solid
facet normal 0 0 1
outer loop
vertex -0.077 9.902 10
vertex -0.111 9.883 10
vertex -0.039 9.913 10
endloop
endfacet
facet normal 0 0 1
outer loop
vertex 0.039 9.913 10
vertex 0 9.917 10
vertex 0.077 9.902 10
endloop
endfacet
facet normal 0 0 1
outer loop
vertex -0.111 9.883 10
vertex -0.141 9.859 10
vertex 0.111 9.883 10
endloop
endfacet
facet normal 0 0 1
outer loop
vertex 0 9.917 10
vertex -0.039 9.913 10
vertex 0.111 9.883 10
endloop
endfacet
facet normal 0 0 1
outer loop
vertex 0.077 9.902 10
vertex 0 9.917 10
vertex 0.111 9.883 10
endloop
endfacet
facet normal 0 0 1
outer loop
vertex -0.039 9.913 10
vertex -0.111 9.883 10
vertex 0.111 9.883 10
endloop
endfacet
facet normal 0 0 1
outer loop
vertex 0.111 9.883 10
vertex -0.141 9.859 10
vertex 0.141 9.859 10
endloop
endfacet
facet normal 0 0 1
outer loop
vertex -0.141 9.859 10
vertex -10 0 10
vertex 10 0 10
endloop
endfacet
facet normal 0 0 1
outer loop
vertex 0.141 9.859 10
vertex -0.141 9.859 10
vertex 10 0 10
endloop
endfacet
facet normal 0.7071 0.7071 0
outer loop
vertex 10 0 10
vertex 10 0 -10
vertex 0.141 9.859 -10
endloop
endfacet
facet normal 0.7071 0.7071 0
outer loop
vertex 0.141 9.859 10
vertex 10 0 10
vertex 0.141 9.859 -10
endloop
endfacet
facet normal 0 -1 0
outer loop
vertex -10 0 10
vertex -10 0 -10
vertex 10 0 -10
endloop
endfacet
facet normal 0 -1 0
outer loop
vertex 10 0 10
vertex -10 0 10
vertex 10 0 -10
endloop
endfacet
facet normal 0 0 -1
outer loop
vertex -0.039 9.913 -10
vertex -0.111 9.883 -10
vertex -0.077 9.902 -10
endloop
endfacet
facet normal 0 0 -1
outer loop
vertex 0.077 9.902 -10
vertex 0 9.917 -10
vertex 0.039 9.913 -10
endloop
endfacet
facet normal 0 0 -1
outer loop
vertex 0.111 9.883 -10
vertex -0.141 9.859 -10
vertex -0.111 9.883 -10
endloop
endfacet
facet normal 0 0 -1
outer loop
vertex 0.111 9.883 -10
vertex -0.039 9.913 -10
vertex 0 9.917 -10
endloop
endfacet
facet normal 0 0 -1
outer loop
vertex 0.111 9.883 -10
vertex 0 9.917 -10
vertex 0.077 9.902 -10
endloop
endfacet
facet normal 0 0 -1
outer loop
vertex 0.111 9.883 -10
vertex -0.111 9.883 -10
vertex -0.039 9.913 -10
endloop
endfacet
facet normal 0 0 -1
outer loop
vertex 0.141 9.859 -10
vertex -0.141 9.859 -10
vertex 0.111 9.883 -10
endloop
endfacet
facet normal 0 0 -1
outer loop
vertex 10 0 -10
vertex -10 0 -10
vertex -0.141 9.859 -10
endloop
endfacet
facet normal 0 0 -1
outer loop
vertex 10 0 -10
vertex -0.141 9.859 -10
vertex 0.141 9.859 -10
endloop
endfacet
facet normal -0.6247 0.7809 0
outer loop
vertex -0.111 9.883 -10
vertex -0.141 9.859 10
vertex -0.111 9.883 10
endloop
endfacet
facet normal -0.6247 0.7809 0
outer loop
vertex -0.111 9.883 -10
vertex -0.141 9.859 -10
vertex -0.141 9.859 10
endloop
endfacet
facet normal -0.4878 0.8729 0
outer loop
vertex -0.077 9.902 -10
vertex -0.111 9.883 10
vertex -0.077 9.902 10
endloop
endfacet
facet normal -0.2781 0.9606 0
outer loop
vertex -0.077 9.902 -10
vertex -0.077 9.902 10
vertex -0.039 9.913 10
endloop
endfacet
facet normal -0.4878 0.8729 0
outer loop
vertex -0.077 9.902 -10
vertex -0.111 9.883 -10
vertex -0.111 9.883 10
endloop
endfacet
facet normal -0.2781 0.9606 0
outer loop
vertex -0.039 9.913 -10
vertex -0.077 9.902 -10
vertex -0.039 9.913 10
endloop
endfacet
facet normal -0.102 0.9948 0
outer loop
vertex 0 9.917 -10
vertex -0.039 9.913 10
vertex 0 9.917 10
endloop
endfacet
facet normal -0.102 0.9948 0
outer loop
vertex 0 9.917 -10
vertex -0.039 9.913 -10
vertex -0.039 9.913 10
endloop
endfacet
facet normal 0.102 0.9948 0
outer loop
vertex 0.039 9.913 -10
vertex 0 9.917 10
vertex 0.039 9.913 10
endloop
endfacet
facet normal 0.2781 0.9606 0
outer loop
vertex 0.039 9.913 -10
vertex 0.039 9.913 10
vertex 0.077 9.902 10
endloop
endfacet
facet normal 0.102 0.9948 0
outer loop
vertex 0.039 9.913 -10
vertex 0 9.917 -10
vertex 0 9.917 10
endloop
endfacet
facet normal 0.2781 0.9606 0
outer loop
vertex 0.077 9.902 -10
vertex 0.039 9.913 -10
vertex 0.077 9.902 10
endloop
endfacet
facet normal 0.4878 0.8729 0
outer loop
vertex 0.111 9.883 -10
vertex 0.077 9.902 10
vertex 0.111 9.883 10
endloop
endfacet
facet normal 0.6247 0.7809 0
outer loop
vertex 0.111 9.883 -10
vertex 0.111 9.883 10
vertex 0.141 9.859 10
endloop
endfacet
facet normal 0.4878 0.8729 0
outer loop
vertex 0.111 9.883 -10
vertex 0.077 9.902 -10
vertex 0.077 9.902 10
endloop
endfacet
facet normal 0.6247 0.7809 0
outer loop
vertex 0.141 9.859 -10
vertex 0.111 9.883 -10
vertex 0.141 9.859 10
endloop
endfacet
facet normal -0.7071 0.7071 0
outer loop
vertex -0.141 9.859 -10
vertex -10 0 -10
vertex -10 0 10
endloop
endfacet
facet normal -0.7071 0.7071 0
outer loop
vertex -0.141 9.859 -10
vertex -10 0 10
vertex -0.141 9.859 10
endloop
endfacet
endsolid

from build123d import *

# Parameters (mm, degrees)
SKETCH1_W           = 20
SKETCH1_H           = 20
BOSS_EXTRUDE1_DEPTH = 10
CUT_EXTRUDE1_DEPTH  = 20
CUT_EXTRUDE3_DEPTH  = 20
FILLET1_R           = 0.2


with BuildPart() as part:
    # Sketch1 → Boss-Extrude1 (new body)
    with BuildSketch(Plane(origin=(0, 0, 0), x_dir=(1, 0, 0), z_dir=(0, 1, 0))):
        Rectangle(SKETCH1_W, SKETCH1_H)
    extrude(amount=BOSS_EXTRUDE1_DEPTH)

    # Sketch2 → Cut-Extrude1 (cut)
    with BuildSketch(Plane.XY.offset(10)):
        Polygon((-10, 10), (-10, 0), (0, 10), align=None)
    extrude(amount=-CUT_EXTRUDE1_DEPTH, mode=Mode.SUBTRACT)

    # Sketch3 → Cut-Extrude3 (cut)
    with BuildSketch(Plane.XY.offset(10)):
        Polygon((0, 10), (10, 10), (10, 0), align=None)
    extrude(amount=-CUT_EXTRUDE3_DEPTH, mode=Mode.SUBTRACT)

    # Fillet1
    fillet1_edges = [part.edges().sort_by_distance(p)[0] for p in [
        (0, 10, 0),
    ]]
    fillet(fillet1_edges, radius=FILLET1_R)


solid = part.part
